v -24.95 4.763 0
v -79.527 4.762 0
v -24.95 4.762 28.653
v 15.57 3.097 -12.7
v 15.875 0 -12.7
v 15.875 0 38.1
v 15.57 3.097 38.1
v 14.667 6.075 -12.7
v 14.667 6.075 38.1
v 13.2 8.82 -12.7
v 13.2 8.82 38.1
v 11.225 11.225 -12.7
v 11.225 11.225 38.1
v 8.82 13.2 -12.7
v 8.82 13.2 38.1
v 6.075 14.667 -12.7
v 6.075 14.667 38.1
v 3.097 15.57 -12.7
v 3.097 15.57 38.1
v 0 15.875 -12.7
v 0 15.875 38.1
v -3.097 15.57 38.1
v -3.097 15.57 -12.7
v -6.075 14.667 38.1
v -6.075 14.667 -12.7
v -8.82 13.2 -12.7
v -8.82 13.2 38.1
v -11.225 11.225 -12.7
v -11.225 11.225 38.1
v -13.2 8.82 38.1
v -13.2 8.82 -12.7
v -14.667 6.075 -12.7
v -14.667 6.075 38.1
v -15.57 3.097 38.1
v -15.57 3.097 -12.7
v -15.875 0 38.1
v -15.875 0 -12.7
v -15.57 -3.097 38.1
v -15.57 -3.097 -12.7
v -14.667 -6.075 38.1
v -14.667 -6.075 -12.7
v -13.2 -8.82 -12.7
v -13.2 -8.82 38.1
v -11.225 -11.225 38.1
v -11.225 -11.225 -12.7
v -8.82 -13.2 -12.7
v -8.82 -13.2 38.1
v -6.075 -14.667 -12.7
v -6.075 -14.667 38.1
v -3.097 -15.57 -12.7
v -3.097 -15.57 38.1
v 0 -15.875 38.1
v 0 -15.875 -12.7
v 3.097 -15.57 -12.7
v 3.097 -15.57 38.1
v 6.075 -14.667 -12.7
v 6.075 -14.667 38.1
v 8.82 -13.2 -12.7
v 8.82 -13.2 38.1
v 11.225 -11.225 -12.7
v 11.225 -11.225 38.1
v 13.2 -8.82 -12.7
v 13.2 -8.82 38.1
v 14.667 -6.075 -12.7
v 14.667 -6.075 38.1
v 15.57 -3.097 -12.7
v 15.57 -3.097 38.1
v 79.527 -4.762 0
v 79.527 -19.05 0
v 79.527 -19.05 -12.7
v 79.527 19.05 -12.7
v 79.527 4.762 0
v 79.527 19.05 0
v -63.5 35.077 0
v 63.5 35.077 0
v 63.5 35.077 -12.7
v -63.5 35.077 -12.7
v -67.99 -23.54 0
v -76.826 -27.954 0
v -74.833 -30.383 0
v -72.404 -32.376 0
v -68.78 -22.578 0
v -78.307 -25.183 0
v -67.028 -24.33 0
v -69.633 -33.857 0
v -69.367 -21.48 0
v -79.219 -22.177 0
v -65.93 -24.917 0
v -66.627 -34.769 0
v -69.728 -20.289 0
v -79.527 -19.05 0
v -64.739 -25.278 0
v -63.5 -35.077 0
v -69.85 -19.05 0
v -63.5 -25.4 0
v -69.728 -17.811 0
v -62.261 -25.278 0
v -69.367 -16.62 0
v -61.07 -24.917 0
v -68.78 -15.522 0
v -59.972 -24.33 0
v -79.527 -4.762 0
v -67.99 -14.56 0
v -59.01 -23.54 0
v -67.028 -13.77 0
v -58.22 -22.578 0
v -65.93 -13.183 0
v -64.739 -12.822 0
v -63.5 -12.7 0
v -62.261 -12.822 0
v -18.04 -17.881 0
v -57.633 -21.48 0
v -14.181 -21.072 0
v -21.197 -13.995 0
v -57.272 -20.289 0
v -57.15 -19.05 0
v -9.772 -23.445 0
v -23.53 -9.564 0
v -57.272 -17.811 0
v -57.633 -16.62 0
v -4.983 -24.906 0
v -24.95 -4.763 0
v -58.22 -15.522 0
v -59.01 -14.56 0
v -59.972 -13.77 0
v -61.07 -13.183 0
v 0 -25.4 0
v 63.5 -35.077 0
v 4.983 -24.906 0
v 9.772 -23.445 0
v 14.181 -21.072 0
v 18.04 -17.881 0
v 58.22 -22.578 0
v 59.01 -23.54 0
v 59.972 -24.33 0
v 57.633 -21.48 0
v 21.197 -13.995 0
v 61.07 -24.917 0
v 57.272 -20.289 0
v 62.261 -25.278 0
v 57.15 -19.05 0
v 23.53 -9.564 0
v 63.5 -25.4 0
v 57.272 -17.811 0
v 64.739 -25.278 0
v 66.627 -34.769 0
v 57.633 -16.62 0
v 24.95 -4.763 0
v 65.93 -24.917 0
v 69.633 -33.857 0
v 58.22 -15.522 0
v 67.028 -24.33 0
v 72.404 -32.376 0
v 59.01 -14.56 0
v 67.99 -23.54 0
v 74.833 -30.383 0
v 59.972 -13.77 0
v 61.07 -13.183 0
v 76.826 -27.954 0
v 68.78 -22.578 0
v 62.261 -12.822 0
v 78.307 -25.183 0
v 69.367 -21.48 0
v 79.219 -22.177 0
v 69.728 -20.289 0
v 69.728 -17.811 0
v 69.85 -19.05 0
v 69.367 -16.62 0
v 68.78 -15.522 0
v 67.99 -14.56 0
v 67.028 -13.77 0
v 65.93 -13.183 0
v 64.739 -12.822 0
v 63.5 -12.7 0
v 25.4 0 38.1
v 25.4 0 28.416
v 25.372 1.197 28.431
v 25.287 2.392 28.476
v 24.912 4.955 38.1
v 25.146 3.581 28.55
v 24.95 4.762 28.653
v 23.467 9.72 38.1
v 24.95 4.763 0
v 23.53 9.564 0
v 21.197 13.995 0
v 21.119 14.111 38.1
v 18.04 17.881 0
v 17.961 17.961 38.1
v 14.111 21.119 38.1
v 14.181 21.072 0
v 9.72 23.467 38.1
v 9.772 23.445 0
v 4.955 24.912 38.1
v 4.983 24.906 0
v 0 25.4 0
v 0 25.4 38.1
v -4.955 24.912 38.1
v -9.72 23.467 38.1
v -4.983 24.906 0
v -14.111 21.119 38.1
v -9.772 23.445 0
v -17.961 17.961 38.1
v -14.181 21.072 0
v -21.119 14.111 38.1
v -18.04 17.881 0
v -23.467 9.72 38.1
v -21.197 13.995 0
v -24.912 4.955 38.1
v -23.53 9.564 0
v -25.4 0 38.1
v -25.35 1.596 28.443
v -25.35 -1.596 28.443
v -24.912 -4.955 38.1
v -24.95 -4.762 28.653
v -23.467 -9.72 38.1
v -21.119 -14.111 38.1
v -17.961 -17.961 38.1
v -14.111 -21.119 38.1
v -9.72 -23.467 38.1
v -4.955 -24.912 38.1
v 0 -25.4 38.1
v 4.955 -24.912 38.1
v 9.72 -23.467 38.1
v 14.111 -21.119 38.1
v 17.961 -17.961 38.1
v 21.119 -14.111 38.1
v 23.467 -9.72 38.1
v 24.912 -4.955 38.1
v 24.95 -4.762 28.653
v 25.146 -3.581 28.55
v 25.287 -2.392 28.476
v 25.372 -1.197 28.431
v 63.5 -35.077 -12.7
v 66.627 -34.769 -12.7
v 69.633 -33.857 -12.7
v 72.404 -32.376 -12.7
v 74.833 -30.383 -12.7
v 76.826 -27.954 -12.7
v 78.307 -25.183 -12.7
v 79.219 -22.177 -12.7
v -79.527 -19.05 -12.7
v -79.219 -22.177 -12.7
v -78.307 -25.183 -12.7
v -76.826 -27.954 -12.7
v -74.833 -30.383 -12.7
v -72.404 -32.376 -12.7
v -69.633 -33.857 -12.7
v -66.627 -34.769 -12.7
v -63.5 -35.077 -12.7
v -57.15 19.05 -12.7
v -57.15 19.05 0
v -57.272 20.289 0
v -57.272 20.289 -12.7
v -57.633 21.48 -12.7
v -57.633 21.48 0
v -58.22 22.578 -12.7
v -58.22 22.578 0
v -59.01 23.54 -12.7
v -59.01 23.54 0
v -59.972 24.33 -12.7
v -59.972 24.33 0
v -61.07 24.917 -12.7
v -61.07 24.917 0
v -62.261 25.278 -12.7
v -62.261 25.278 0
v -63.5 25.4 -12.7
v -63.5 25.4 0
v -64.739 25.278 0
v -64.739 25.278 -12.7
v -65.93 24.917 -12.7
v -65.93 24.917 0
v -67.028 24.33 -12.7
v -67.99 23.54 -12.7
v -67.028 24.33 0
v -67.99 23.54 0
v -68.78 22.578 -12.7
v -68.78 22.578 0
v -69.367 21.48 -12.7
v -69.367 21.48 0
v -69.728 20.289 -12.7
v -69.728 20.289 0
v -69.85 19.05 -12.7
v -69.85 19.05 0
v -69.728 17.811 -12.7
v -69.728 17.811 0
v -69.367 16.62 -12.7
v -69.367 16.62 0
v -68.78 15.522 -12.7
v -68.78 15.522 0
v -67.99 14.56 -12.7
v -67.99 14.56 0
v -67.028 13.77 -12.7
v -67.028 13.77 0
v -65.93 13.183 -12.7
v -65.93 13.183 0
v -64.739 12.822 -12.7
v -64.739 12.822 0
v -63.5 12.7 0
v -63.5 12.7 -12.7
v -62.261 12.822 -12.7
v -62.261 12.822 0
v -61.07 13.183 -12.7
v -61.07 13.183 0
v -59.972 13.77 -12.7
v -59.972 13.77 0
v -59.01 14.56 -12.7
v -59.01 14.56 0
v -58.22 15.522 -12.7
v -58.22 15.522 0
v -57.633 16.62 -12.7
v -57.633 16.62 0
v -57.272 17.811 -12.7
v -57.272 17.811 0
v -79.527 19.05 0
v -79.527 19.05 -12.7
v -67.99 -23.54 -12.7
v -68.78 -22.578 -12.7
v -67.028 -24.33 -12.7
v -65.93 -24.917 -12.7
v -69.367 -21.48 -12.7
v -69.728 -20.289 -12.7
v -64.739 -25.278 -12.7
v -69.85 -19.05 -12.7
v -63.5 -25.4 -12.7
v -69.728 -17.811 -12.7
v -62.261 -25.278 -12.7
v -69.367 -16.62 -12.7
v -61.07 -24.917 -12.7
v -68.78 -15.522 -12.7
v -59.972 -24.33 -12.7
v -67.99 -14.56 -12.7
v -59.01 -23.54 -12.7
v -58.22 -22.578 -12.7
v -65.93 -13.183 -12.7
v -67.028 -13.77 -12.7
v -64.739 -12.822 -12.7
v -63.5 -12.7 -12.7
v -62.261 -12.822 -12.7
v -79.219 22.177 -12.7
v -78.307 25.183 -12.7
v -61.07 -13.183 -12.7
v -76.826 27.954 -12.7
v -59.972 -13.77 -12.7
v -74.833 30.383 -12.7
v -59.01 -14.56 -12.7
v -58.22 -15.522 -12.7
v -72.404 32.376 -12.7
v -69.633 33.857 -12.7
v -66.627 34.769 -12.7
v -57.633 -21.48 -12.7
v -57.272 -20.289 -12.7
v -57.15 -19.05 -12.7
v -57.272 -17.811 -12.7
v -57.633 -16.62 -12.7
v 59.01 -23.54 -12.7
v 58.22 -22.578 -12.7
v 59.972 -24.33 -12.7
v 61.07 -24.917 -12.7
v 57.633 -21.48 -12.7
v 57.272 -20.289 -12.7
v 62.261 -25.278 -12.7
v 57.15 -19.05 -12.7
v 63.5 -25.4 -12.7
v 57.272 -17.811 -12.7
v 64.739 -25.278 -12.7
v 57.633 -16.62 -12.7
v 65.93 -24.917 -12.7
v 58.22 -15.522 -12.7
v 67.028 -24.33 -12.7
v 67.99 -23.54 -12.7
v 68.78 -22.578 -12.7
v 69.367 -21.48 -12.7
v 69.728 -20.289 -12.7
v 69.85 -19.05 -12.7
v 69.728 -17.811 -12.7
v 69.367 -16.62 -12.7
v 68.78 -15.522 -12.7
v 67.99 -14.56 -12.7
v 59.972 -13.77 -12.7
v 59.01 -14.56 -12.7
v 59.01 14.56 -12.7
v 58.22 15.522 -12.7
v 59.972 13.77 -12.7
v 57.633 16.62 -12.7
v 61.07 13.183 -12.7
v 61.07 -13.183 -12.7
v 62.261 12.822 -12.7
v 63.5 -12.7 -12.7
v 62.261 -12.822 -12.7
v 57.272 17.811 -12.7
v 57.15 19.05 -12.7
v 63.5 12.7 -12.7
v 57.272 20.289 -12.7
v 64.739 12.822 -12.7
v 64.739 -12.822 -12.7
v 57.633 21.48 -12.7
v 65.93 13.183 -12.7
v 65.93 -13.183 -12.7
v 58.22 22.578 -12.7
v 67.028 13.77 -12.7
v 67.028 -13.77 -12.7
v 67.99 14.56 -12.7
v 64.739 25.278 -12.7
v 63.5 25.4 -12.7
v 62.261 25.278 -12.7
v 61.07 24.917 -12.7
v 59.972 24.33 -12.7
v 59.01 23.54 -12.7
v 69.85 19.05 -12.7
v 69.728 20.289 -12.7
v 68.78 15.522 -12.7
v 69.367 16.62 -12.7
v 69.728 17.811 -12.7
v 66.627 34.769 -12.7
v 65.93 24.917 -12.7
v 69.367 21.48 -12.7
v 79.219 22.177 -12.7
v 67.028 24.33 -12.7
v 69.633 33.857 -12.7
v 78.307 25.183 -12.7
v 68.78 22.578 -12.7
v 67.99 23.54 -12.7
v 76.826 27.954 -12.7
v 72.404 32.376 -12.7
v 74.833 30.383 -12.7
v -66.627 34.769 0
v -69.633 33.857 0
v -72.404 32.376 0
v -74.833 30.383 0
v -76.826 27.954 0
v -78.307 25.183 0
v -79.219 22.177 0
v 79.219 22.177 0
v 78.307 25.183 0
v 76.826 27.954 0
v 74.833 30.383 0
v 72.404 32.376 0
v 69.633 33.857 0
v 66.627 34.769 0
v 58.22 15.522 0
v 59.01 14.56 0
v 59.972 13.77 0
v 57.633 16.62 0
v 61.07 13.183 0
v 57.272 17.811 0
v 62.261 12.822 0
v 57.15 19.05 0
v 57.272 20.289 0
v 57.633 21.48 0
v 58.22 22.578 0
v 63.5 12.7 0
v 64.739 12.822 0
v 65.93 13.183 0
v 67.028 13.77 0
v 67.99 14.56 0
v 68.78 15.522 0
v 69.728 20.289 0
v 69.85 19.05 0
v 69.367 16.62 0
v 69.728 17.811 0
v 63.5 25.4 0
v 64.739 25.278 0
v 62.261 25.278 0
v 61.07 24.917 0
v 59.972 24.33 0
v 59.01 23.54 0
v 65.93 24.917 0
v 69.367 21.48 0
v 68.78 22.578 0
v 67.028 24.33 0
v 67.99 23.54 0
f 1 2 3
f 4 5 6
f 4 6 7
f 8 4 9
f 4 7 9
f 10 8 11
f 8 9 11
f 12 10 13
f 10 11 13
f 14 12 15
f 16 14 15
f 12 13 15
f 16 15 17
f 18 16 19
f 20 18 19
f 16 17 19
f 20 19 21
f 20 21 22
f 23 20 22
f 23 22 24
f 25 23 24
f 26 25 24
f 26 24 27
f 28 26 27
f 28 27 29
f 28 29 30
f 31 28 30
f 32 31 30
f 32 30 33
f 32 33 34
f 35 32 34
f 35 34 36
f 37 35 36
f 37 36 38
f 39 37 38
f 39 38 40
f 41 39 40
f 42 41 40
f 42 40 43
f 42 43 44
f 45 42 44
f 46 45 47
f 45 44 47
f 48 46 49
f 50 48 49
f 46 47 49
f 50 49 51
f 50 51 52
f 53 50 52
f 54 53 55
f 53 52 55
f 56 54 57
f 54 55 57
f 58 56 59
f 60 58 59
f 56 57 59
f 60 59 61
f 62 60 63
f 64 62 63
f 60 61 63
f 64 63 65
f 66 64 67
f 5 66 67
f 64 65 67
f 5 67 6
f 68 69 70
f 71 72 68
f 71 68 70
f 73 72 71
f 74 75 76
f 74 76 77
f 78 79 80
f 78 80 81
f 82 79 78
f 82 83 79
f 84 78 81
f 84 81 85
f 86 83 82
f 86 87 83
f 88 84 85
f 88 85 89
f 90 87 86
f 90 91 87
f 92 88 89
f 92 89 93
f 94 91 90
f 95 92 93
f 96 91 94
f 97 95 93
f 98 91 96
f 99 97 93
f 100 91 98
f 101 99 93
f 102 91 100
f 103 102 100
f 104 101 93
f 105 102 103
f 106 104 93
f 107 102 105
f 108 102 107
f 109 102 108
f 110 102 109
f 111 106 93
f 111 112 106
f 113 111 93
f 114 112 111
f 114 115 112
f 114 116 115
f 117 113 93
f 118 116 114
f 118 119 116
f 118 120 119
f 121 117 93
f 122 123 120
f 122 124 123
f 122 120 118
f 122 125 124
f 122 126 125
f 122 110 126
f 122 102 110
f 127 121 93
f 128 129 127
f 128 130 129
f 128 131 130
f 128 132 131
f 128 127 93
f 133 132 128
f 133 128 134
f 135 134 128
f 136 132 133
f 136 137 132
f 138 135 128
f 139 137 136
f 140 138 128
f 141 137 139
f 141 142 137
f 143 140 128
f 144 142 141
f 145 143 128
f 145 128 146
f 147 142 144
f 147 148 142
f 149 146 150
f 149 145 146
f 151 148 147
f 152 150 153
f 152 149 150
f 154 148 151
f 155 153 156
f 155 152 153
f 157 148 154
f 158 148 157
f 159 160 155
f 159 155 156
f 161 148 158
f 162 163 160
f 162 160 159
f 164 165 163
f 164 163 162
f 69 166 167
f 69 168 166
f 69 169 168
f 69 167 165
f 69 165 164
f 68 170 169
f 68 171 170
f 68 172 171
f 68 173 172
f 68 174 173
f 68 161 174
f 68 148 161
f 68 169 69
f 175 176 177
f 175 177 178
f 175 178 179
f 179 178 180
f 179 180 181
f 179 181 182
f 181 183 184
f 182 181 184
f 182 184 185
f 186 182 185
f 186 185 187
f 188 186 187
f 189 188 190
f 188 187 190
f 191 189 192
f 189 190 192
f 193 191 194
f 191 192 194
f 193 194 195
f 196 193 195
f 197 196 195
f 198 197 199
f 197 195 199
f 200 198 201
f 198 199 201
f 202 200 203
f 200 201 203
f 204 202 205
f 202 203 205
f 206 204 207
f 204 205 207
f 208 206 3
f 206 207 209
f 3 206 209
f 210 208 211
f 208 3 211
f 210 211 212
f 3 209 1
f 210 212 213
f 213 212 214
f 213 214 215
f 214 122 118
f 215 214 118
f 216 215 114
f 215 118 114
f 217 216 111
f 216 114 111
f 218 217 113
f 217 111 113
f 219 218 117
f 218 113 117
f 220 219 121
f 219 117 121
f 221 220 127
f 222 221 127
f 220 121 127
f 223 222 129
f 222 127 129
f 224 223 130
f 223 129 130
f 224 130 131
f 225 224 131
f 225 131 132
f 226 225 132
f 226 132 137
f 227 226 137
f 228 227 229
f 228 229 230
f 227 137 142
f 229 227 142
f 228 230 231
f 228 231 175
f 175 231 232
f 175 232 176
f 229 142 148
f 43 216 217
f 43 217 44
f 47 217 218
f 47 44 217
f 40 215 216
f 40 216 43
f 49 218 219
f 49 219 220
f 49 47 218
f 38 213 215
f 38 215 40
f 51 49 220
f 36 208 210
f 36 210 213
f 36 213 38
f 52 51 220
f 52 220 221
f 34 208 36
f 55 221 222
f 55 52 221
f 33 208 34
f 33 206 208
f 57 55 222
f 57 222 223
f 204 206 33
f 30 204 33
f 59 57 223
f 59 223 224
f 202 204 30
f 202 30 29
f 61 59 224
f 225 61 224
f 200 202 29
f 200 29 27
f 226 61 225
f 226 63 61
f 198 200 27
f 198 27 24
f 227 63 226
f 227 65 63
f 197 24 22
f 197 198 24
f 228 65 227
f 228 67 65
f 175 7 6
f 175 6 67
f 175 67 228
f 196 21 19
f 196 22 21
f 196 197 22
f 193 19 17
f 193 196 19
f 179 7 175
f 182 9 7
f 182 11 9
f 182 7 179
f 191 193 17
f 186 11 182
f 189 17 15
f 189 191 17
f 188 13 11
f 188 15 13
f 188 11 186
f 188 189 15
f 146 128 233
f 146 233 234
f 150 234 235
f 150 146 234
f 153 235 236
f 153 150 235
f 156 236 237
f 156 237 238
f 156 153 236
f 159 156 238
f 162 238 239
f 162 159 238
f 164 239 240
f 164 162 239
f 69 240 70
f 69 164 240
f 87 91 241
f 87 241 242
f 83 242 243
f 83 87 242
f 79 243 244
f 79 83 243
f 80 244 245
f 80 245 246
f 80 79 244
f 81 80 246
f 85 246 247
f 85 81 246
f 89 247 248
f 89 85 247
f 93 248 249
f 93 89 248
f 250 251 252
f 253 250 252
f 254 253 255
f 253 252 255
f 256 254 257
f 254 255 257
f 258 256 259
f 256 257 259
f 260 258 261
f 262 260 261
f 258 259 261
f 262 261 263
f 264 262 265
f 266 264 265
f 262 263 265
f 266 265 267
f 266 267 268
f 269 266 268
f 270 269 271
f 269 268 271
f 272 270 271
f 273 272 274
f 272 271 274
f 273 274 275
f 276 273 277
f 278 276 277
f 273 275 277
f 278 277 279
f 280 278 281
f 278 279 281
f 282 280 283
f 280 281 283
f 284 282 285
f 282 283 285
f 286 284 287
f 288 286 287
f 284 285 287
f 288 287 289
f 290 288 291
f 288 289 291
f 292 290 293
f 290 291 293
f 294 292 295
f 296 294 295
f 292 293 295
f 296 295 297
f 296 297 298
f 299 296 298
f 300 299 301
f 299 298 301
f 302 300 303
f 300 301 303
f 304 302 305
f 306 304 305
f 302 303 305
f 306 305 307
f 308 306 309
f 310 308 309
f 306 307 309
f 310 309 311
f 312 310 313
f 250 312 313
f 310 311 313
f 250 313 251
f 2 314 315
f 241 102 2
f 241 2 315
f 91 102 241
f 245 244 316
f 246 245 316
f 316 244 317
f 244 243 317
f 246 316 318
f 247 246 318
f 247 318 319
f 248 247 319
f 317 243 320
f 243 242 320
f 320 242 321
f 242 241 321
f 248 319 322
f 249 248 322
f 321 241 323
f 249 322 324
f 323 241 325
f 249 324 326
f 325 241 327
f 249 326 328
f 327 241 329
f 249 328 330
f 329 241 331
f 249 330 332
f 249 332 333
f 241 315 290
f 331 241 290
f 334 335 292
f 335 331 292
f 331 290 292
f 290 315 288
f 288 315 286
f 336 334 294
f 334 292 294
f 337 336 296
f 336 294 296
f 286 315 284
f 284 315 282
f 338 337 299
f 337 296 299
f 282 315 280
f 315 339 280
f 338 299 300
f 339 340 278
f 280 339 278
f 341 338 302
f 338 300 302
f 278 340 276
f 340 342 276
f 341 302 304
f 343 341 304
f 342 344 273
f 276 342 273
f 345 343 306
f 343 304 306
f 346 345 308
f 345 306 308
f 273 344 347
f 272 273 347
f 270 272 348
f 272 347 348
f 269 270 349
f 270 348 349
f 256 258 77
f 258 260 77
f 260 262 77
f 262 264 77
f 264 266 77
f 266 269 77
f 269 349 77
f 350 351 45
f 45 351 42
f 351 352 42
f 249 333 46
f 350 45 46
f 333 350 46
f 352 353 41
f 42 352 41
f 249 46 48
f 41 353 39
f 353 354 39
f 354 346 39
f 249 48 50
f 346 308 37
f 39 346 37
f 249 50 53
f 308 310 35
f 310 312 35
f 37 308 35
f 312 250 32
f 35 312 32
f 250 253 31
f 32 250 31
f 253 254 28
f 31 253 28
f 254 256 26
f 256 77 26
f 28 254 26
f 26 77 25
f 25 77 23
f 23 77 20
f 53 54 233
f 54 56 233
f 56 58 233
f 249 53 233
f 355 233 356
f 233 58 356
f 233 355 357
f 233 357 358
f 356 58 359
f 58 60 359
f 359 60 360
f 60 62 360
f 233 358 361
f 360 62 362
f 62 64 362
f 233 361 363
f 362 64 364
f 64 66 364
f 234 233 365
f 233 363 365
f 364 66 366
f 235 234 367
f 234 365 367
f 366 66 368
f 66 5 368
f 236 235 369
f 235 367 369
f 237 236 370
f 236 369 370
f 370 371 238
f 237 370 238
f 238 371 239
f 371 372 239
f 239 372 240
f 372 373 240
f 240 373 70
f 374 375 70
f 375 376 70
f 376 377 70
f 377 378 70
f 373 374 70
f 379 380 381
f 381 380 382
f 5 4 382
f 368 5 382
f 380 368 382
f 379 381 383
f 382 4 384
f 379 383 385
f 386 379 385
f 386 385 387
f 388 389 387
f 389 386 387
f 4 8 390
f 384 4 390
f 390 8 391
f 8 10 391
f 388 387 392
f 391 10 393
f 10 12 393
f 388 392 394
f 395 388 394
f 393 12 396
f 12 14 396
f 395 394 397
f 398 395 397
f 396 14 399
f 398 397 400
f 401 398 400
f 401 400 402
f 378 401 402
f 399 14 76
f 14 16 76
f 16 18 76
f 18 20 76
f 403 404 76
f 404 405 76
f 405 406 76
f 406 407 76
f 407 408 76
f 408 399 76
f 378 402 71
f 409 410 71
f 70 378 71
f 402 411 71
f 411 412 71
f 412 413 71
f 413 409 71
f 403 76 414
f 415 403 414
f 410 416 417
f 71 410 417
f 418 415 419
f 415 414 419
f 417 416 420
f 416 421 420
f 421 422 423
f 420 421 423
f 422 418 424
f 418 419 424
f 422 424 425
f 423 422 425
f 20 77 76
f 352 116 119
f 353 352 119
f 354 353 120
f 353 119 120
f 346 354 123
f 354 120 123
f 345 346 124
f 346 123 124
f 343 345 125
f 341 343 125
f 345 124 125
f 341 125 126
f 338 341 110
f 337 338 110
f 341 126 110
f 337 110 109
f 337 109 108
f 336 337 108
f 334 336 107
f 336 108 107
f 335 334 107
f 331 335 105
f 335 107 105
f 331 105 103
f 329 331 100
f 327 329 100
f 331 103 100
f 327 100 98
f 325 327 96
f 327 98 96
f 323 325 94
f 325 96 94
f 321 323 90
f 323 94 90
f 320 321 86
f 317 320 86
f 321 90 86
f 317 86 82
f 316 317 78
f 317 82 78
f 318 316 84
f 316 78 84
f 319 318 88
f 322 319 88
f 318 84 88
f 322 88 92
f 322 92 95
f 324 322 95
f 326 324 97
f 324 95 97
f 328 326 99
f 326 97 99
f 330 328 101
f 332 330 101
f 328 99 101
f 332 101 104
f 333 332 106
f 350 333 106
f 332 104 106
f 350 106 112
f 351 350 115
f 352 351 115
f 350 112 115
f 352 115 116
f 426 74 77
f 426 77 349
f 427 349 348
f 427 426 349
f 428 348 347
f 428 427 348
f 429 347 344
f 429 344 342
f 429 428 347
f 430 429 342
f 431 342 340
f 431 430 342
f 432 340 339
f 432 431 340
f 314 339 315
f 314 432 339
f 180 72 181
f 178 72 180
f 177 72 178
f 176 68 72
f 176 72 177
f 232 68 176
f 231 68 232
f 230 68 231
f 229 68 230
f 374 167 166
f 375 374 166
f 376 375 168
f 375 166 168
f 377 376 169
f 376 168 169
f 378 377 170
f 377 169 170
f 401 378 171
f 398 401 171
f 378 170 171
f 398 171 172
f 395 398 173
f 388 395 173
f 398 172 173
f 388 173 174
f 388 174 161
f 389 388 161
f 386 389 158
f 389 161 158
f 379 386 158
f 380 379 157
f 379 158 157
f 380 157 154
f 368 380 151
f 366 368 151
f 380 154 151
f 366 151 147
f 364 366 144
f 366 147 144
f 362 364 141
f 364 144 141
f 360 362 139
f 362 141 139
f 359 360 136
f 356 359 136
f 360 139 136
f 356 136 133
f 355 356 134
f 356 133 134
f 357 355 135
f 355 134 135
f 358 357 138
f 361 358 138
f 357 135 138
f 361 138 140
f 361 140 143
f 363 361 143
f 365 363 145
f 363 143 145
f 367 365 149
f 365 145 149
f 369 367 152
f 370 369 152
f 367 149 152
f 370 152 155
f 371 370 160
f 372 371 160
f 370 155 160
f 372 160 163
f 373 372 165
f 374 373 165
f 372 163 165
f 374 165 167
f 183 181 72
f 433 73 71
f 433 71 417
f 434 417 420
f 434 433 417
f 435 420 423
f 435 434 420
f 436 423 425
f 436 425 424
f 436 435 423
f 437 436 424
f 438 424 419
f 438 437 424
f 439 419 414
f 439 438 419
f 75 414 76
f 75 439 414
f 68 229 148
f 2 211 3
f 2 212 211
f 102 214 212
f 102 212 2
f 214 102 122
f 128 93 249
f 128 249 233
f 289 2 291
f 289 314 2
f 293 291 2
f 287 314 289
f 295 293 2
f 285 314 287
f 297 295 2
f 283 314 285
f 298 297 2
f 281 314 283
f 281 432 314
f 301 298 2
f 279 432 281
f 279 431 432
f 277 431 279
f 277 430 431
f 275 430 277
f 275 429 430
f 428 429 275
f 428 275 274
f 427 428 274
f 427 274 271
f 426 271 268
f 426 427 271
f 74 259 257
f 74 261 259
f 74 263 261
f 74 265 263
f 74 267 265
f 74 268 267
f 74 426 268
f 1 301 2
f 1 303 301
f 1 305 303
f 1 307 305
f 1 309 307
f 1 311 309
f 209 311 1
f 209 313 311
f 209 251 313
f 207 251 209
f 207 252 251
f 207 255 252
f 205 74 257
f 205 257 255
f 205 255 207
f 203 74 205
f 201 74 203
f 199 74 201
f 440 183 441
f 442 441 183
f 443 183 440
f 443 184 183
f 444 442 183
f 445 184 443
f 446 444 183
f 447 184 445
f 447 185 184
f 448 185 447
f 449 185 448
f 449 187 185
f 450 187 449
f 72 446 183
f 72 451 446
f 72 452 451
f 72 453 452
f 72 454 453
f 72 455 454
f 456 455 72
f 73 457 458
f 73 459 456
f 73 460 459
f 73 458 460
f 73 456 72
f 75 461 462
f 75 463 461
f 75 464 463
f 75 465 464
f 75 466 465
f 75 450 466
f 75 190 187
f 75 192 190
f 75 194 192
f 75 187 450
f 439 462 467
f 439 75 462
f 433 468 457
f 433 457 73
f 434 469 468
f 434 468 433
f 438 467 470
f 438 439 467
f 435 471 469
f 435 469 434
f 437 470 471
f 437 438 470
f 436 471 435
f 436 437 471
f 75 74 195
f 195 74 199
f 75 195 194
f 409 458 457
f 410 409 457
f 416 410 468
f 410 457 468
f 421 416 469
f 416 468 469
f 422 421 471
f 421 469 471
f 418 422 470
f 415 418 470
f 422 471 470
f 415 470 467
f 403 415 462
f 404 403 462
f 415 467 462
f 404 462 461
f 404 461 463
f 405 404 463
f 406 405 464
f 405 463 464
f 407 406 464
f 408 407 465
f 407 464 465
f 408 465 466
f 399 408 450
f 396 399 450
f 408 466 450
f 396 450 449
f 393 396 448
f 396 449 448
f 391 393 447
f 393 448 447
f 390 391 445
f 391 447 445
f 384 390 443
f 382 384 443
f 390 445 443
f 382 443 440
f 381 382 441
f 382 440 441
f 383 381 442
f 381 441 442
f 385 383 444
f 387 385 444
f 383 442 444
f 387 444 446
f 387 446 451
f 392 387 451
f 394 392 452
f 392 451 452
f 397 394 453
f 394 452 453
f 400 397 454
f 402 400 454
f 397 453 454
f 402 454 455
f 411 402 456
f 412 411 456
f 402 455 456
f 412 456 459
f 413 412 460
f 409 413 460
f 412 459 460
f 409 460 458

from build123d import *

# Parameters (mm, degrees)
F0_R     = 6.35
F1_DEPTH = 12.7
F2_R     = 25.4
F3_DEPTH = 38.1
F5_DEPTH = 4.7625
F6_R     = 15.875
F7_DEPTH = 50.801


with BuildPart() as f1:
    # F0 (on Top) → F1 (new body)
    with BuildSketch(Plane.XY):
        with BuildLine():
            Line((-63.5, -35.076942), (0, -35.076942))
            Line((0, -35.076942), (63.5, -35.076942))
            ThreePointArc((63.5, -35.076942), (74.83276, -30.38276), (79.526942, -19.05))
            Line((79.526942, -19.05), (79.526942, 0))
            Line((79.526942, 0), (79.526942, 19.05))
            ThreePointArc((79.526942, 19.05), (74.83276, 30.38276), (63.5, 35.076942))
            Line((63.5, 35.076942), (0, 35.076942))
            Line((0, 35.076942), (-63.5, 35.076942))
            ThreePointArc((-63.5, 35.076942), (-74.83276, 30.38276), (-79.526942, 19.05))
            Line((-79.526942, 19.05), (-79.526942, 0))
            Line((-79.526942, 0), (-79.526942, -19.05))
            ThreePointArc((-79.526942, -19.05), (-74.83276, -30.38276), (-63.5, -35.076942))
        make_face()
        with Locations((-63.5, -19.05)):
            Circle(F0_R, mode=Mode.SUBTRACT)
        with Locations((63.5, -19.05)):
            Circle(F0_R, mode=Mode.SUBTRACT)
        with Locations((-63.5, 19.05)):
            Circle(F0_R, mode=Mode.SUBTRACT)
        with Locations((63.5, 19.05)):
            Circle(F0_R, mode=Mode.SUBTRACT)
    extrude(amount=-F1_DEPTH)

    # F2 (on face) → F3 (join)
    with BuildSketch(Plane.XY):
        Circle(F2_R)
    extrude(amount=F3_DEPTH)

    # F4 (on Front) → F5 (join, symmetric)
    with BuildSketch(Plane.XZ):
        Polygon((-19.05, 31.75), (-79.5274, 0), (79.5274, 0), (19.05, 31.75), align=None)
    extrude(amount=F5_DEPTH, both=True)

    # F6 (on face) → F7 (cut, through all)
    with BuildSketch(Plane.XY.offset(38.1)):
        Circle(F6_R)
    extrude(amount=-F7_DEPTH, mode=Mode.SUBTRACT)


solid = f1.part
